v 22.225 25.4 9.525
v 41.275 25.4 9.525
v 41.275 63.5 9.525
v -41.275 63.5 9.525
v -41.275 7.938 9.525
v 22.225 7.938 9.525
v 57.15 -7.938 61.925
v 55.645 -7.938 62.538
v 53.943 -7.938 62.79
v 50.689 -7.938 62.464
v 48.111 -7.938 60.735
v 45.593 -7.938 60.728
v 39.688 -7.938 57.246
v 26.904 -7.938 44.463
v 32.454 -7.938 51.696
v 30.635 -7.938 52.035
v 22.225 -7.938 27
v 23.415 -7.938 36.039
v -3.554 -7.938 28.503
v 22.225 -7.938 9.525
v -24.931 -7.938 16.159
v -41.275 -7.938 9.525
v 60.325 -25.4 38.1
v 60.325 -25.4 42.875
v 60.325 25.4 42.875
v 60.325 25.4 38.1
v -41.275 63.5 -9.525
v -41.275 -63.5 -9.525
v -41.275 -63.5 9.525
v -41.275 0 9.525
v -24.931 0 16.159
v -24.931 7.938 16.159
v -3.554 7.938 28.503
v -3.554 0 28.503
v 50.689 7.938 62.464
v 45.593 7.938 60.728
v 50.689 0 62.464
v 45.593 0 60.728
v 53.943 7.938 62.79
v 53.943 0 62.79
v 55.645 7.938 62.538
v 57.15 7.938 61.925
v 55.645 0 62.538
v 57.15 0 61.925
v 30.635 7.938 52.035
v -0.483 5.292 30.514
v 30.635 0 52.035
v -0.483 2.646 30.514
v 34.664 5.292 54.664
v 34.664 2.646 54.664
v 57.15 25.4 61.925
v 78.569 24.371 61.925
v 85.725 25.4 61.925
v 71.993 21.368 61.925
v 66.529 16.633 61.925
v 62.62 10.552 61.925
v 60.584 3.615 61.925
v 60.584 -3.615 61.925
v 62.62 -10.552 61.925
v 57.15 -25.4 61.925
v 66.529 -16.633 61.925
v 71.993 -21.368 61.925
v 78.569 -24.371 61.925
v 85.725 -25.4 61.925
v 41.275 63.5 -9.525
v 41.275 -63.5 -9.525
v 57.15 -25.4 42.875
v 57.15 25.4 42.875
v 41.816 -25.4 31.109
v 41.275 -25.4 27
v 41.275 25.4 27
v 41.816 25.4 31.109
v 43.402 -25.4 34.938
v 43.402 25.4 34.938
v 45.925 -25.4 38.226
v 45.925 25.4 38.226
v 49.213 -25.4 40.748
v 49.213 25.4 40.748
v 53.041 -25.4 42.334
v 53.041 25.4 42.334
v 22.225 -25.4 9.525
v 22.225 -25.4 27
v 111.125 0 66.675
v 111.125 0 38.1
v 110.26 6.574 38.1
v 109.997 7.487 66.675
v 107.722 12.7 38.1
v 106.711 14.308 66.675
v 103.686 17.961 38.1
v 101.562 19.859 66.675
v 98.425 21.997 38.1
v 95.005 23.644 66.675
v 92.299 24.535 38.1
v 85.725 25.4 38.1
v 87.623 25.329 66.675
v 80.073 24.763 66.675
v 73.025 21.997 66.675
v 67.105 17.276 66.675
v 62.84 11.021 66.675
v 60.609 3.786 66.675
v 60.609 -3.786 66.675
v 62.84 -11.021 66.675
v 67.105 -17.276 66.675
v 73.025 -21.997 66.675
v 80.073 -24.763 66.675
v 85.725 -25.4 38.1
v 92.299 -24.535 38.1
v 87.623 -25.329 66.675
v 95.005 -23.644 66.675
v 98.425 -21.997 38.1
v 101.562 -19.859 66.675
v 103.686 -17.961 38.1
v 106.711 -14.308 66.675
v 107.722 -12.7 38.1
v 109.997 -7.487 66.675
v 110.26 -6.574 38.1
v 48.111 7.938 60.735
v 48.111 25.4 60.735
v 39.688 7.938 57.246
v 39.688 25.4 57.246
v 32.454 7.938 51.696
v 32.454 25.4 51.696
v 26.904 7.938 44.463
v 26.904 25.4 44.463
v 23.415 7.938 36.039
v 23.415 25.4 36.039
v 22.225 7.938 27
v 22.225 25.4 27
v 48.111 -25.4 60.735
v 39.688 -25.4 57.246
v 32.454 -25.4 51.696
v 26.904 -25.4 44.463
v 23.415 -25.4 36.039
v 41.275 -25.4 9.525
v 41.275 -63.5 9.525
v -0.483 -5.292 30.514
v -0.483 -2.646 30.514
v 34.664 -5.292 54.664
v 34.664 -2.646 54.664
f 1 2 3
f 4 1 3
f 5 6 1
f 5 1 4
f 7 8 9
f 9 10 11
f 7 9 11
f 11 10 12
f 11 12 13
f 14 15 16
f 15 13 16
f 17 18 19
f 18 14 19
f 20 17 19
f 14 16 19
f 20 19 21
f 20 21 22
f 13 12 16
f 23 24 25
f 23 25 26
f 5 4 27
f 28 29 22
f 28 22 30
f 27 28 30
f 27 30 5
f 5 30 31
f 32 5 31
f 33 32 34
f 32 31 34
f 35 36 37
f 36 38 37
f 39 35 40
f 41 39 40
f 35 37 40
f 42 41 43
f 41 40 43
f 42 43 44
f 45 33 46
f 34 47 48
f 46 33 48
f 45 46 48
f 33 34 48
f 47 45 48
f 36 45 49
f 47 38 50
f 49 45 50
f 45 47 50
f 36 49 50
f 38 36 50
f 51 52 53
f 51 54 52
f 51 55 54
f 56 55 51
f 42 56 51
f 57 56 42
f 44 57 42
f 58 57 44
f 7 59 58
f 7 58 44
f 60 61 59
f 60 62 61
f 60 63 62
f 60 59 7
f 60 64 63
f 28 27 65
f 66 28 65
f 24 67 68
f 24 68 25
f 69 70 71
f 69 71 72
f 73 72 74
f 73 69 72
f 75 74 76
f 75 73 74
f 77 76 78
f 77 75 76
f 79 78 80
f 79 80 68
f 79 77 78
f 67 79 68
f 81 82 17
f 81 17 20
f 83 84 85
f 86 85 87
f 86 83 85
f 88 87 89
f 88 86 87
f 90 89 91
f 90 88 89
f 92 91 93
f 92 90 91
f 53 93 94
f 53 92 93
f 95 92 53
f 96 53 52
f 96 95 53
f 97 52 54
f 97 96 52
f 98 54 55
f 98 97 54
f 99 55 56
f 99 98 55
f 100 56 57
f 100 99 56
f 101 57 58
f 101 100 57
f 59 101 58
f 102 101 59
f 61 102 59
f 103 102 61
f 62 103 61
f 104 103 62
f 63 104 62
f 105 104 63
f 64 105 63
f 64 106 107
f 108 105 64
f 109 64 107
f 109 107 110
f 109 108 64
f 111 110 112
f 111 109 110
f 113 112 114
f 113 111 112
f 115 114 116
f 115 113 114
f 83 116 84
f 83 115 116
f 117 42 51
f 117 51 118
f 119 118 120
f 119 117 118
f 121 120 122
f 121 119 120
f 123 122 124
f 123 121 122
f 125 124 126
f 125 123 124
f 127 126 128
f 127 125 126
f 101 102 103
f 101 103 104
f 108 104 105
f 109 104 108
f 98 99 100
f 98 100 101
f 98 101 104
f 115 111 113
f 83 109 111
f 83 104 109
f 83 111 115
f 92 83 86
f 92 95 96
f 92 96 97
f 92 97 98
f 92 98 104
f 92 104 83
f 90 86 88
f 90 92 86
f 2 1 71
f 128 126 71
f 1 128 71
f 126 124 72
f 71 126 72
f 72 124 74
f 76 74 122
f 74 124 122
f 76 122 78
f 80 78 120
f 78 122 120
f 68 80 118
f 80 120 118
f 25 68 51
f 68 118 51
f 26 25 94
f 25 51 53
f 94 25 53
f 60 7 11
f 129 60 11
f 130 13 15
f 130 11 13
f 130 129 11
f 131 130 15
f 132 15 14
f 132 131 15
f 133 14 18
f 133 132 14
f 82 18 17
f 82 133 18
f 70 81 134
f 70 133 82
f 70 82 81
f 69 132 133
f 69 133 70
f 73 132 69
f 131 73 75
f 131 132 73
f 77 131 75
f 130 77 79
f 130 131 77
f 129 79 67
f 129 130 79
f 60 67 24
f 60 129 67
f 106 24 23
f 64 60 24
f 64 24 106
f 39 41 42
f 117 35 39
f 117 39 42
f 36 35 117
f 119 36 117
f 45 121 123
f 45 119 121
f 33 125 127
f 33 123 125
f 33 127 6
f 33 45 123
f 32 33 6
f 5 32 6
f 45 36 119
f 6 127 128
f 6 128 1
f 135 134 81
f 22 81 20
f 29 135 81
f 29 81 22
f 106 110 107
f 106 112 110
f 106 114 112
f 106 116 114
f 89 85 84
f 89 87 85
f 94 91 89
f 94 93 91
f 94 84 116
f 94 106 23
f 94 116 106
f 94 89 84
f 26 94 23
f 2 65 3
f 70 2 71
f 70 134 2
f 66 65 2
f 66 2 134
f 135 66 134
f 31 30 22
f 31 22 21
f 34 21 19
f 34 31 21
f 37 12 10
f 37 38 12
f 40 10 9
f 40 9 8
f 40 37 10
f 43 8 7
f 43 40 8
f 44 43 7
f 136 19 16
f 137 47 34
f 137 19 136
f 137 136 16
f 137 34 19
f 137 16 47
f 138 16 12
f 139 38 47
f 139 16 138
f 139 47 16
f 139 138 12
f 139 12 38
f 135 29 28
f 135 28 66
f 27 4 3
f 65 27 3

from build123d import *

# Parameters (mm, degrees)
F1_DEPTH = 63.5
F2_DEPTH = 25.4
F3_DEPTH = 7.9375


with BuildPart() as f1:
    # F0 (on Front) → F1 (new body, symmetric)
    with BuildSketch(Plane.XZ):
        Polygon((-41.275, 9.525), (-41.275, -9.525), (41.275, -9.525), (41.275, 9.525), (22.225, 9.525), align=None)
    extrude(amount=F1_DEPTH, both=True)

    # F0 (on Front) → F2 (join, symmetric)
    with BuildSketch(Plane.XZ):
        with BuildLine():
            Line((22.225, 9.525), (41.275, 9.525))
            Line((41.275, 9.525), (41.275, 27.0002))
            ThreePointArc((41.275, 27.0002), (45.92468, 38.22552), (57.15, 42.8752))
            Line((57.15, 42.8752), (60.325, 42.8752))
            Line((60.325, 42.8752), (60.325, 61.9252))
            Line((60.325, 61.9252), (57.15, 61.9252))
            ThreePointArc((57.15, 61.9252), (32.454296, 51.695904), (22.225, 27.0002))
            Line((22.225, 27.0002), (22.225, 9.525))
        make_face()
        Polygon((85.725, 61.9252), (60.325, 61.9252), (60.325, 42.8752), (60.325, 38.1), (85.725, 38.1), align=None)
    extrude(amount=F2_DEPTH, both=True)

    # F0 (on Front) → F3 (join, symmetric)
    with BuildSketch(Plane.XZ):
        with BuildLine():
            add(Edge.make_bspline(
                [(-41.275, 9.525), (0, 22.249181), (43.333913, 69.793309), (57.15, 61.9252)],
                knots=[0, 0, 0, 0, 111.504536, 111.504536, 111.504536, 111.504536], degree=3))
            Line((-41.275, 9.525), (22.225, 9.525))
            Line((22.225, 9.525), (22.225, 27.0002))
            ThreePointArc((22.225, 27.0002), (32.454296, 51.695904), (57.15, 61.9252))
        make_face()
    extrude(amount=F3_DEPTH, both=True)

    # F0 (on Front) → F4 (revolve)
    with BuildSketch(Plane.XZ):
        Polygon((85.725, 66.675), (85.725, 61.9252), (85.725, 38.1), (111.125, 38.1), (111.125, 66.675), align=None)
    revolve(axis=Axis((85.725, 0, 52.3875), (0, 0, 1)))


solid = f1.part
